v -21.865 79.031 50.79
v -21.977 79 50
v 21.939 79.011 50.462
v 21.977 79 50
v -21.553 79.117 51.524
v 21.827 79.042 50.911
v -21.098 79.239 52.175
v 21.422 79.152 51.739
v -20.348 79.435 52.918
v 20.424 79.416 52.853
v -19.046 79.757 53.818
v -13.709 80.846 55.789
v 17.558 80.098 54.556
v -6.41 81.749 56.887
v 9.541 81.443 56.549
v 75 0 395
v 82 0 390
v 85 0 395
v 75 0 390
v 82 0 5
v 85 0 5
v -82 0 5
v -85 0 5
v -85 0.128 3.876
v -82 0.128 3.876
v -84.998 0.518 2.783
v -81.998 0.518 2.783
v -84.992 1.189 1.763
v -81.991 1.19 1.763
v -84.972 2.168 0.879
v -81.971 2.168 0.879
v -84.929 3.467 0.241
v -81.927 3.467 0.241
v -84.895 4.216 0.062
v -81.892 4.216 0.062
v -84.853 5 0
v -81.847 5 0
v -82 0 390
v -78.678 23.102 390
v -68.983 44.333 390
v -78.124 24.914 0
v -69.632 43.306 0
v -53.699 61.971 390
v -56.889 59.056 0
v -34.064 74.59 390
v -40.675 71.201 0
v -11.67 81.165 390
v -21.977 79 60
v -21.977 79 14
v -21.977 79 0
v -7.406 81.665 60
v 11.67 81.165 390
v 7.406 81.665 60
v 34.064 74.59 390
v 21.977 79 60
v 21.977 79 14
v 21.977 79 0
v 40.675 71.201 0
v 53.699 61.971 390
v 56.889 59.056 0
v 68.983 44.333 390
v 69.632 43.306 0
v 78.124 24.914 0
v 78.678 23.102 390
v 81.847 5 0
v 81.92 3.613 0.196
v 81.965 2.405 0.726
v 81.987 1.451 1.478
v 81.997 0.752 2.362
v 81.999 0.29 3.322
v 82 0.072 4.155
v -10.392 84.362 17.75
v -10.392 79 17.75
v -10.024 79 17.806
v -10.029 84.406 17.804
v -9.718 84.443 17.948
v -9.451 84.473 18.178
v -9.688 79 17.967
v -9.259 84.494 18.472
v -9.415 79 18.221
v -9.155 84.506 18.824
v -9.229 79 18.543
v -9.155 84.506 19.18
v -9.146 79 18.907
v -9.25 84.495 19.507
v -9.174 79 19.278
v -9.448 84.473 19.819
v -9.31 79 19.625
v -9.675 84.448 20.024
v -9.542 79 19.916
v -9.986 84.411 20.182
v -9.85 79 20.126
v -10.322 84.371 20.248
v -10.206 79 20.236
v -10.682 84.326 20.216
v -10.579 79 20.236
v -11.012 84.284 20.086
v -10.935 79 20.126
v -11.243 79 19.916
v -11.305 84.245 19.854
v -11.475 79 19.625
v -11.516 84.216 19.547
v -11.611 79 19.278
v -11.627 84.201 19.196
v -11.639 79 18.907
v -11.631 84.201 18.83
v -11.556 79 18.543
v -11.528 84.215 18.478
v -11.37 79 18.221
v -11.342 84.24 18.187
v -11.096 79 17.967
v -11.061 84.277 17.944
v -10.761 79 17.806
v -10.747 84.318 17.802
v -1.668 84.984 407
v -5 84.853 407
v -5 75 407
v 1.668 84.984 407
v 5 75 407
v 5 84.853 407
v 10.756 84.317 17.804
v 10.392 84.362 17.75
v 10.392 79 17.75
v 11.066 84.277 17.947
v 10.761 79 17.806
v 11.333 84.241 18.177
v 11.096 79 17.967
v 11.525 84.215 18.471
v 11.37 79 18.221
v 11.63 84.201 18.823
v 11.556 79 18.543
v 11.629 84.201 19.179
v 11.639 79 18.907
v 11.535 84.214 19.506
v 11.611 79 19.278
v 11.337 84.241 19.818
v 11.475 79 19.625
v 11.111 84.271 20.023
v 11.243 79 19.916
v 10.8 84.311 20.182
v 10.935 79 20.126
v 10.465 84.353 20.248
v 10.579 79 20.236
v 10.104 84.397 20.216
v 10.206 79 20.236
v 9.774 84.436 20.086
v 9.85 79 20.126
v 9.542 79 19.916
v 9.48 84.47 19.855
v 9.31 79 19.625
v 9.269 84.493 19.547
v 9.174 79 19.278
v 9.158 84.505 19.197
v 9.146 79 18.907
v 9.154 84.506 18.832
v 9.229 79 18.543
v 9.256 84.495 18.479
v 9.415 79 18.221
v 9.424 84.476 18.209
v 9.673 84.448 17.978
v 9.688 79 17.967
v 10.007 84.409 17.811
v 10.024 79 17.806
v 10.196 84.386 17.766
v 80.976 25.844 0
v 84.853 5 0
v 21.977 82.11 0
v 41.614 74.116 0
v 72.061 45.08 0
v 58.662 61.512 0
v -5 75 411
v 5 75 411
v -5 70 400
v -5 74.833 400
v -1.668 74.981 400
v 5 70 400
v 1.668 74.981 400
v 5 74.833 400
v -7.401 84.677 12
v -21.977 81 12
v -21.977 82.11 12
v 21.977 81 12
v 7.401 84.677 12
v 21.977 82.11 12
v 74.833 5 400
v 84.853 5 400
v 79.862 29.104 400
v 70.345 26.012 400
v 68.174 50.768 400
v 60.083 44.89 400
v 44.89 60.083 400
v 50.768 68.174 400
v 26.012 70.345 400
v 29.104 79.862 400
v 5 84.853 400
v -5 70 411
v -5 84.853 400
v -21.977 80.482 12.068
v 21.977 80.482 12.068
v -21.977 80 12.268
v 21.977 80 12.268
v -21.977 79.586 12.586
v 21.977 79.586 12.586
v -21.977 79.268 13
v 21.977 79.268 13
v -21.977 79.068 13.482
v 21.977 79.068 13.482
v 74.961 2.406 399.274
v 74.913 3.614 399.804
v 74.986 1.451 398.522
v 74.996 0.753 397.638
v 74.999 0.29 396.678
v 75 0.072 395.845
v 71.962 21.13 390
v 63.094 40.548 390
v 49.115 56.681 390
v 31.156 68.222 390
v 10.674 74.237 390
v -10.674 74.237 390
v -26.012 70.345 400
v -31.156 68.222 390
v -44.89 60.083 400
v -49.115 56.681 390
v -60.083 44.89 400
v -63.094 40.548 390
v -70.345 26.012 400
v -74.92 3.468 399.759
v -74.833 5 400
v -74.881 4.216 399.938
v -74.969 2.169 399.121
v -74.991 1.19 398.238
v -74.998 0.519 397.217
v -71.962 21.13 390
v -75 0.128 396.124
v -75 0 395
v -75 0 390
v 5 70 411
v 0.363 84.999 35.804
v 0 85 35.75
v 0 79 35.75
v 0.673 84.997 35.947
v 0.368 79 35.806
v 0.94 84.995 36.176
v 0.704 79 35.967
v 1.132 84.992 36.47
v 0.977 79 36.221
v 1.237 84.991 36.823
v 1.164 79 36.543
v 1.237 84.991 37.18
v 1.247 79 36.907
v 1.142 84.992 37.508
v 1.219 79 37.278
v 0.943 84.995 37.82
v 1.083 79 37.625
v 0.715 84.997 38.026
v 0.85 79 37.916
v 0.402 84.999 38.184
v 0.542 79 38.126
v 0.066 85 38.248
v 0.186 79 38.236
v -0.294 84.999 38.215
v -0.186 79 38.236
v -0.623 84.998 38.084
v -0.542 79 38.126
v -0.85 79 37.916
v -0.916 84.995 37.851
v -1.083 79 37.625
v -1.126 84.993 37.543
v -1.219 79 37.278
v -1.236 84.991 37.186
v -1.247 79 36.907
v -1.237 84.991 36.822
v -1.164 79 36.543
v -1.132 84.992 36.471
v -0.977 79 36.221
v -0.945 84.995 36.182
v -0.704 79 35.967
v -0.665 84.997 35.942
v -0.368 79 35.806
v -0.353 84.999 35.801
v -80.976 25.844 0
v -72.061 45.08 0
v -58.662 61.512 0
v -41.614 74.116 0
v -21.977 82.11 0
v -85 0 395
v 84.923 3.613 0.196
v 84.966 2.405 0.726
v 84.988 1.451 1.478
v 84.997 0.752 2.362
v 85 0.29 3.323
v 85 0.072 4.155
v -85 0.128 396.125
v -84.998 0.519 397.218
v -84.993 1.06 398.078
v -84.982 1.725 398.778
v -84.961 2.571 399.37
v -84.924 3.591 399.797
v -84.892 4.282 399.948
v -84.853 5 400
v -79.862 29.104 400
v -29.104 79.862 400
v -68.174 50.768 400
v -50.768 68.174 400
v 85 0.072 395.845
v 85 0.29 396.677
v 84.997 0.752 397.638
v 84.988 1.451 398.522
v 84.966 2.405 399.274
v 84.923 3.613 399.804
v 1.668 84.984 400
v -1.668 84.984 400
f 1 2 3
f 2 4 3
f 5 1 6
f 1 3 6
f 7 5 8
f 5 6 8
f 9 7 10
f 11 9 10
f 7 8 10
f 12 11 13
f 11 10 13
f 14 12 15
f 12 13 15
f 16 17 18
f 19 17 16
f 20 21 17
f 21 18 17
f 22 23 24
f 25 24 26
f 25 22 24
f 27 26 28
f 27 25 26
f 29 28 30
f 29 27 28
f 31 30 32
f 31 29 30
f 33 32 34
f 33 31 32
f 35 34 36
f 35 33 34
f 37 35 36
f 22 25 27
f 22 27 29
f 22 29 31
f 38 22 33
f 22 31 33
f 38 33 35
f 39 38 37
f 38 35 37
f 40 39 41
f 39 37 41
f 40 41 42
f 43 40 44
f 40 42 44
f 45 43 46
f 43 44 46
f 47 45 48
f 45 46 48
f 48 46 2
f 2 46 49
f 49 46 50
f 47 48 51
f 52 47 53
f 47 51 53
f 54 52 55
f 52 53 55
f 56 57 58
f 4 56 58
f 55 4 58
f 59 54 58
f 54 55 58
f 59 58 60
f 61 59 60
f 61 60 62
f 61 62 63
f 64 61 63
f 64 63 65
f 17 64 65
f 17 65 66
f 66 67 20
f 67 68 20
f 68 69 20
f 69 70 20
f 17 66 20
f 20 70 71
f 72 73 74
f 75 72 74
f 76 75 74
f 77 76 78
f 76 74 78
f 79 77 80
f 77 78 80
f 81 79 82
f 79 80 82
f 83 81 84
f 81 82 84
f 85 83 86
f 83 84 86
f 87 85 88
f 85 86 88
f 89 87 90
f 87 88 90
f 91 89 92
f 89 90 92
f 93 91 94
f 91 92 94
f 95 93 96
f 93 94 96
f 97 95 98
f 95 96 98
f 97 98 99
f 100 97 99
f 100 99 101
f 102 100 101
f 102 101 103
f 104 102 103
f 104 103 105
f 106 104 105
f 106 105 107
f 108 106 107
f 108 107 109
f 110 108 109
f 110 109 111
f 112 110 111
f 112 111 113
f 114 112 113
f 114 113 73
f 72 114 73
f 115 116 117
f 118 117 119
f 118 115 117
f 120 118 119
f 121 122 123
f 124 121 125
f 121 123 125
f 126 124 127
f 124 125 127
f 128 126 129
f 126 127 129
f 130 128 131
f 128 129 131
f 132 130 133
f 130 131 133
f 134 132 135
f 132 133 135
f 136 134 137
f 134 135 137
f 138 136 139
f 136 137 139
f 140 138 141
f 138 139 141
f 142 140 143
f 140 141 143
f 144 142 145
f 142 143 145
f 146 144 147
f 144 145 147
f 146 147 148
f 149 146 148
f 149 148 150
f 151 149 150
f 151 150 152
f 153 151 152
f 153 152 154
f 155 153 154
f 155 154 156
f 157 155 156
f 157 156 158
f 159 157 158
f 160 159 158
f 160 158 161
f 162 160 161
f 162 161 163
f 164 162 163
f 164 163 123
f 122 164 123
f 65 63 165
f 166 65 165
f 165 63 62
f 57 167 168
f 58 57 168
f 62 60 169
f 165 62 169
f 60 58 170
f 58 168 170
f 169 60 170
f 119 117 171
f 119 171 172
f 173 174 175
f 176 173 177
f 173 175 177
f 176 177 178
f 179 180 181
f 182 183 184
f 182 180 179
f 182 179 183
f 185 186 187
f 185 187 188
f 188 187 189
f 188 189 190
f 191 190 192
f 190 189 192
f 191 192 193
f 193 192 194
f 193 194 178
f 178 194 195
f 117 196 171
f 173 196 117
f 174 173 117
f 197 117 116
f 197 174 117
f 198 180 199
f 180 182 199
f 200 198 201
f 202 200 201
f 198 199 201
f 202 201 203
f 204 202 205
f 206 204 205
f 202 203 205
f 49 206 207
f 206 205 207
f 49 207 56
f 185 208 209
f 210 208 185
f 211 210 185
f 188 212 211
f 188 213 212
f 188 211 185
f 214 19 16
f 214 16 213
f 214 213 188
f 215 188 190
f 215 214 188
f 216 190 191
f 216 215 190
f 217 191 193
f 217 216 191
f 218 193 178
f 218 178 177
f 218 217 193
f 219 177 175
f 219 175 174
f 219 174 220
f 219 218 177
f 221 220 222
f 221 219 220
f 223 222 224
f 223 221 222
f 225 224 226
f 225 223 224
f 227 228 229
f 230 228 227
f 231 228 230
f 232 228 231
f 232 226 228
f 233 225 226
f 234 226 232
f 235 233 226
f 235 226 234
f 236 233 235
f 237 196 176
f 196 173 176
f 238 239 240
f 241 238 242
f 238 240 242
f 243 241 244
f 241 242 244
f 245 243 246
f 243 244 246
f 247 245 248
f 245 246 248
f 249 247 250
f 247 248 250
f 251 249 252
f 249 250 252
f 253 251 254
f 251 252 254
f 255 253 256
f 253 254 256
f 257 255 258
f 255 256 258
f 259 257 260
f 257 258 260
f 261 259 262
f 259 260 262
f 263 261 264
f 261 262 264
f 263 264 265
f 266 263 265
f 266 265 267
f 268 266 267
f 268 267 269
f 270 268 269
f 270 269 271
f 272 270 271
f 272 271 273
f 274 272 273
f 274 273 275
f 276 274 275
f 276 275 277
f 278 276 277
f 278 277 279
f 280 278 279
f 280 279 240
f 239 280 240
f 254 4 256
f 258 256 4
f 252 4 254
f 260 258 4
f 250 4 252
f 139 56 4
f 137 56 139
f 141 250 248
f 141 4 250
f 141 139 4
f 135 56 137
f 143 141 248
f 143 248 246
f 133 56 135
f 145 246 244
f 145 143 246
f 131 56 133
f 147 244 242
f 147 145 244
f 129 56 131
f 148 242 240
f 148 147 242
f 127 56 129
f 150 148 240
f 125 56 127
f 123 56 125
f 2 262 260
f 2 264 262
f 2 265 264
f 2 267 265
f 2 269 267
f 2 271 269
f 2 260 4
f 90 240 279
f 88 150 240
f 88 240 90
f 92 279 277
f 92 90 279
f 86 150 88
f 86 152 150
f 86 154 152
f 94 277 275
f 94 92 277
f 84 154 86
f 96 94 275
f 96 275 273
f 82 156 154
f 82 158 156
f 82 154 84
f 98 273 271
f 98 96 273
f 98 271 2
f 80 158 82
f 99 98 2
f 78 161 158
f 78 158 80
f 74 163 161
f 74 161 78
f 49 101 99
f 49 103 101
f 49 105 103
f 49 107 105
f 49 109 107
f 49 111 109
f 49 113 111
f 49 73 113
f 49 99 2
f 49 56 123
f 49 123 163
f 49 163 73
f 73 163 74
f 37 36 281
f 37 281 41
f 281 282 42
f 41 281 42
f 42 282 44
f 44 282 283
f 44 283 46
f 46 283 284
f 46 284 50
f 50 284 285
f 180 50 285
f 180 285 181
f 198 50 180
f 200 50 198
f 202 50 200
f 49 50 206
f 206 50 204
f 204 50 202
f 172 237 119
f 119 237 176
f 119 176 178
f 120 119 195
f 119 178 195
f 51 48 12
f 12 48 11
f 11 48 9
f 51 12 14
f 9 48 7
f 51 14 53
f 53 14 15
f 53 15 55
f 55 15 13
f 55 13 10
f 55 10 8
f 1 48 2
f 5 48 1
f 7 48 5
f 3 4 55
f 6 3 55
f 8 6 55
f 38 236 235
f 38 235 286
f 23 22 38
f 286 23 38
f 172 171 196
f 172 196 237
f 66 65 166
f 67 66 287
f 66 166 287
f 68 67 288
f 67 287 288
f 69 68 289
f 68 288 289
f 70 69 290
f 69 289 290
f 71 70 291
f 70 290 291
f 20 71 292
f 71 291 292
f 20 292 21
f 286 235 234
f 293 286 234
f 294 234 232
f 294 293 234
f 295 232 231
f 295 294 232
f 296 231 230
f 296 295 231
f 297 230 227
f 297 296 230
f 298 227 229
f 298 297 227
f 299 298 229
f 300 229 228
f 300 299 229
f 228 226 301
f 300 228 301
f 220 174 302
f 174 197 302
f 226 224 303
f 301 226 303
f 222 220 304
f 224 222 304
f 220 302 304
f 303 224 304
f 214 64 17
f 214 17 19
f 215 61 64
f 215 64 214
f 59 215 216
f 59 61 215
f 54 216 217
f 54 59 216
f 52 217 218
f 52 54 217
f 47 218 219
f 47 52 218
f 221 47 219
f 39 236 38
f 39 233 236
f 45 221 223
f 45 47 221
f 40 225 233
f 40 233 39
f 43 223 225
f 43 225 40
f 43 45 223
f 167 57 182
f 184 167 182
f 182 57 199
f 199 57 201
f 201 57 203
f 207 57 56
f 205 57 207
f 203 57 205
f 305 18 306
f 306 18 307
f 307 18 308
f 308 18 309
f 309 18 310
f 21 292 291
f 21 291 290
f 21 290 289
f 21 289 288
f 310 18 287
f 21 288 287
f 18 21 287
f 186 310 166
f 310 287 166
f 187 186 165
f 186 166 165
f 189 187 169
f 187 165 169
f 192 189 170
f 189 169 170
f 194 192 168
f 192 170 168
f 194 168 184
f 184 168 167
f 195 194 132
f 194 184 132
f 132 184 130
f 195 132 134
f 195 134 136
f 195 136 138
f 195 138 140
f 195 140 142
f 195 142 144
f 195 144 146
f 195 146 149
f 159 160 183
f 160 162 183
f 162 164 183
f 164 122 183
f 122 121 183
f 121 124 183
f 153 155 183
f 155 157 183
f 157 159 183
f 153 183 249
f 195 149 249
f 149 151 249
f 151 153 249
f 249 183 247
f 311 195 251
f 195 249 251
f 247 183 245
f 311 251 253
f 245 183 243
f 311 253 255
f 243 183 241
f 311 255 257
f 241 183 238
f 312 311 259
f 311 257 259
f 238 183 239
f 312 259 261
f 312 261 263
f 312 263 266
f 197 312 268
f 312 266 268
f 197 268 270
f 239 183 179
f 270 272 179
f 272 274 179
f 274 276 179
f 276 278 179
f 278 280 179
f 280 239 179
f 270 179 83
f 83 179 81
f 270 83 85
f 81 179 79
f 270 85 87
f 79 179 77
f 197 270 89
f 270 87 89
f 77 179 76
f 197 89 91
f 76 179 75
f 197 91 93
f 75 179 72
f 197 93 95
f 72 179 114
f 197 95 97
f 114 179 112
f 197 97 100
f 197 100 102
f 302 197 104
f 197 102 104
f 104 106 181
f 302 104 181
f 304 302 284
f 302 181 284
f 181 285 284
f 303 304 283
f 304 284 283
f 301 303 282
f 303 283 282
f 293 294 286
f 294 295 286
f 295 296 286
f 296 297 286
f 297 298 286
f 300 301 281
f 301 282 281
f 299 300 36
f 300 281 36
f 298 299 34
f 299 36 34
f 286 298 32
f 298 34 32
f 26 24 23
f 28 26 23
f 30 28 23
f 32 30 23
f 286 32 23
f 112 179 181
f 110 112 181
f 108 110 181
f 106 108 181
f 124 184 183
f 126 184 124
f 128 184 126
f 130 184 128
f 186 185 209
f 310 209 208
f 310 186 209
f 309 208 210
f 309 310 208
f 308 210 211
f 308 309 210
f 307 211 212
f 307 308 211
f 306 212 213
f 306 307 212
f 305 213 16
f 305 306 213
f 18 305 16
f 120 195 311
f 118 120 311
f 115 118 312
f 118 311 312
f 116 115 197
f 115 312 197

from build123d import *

# Parameters (mm, degrees)
BOSS_EXTRUDE1_DEPTH = 400
BOSS_EXTRUDE3_DEPTH = 60
FILLET4_R           = 10
SKETCH6_R           = 1.25
SKETCH6_W           = 43.954521952
SKETCH6_H           = 12
CUT_EXTRUDE5_DEPTH  = 50
BOSS_EXTRUDE4_START = -10
BOSS_EXTRUDE4_DEPTH = 10
BOSS_EXTRUDE5_DEPTH = 7
SKETCH10_W          = 10
SKETCH10_H          = 5
BOSS_EXTRUDE6_DEPTH = 4
FILLET6_R           = 5
FILLET7_R           = 2


with BuildPart() as part:
    # Sketch1 → Boss-Extrude1 (new body)
    with BuildSketch(Plane.XY):
        with BuildLine():
            Line((-85, 0), (-82, 0))
            ThreePointArc((-82, 0), (0, 82), (82, 0))
            Line((82, 0), (85, 0))
            ThreePointArc((85, 0), (0, 85), (-85, 0))
        make_face()
    extrude(amount=BOSS_EXTRUDE1_DEPTH)

    # Sketch5 → Boss-Extrude3 (add)
    with BuildSketch(Plane(origin=(0, 0, 0), x_dir=(-1, 0, 0), z_dir=(0, 0, -1))):
        with BuildLine():
            Line((-21.977260976, 79), (21.977260976, 79))
            ThreePointArc((21.977260976, 79), (0, 82), (-21.977260976, 79))
        make_face()
    extrude(amount=-BOSS_EXTRUDE3_DEPTH)

    # Fillet4
    # the kernel refuses this fillet: 10 mm, written as the material it takes off along each edge
    with BuildSketch(Plane(origin=(46.977260976, 79, 60), x_dir=(0, 0, -1), z_dir=(-1, 0, 0))) as fillet4_piece_1_section:
        with BuildLine():
            CenterArc((FILLET4_R, -FILLET4_R), FILLET4_R, 90, 90)
            Line((0, -FILLET4_R), (0, 0))
            Line((0, 0), (FILLET4_R, 0))
        make_face()
    fillet4_piece_1 = extrude(amount=93.954521952, mode=Mode.PRIVATE)
    fillet4_piece_1 = fillet4_piece_1 & Plane(origin=(0, 0, 56.767461198), x_dir=(-1, 0, 0), z_dir=(0, 0, -1)) * Cylinder(82, 228, mode=Mode.PRIVATE)
    add(fillet4_piece_1, mode=Mode.SUBTRACT)

    # Sketch6 → Cut-Extrude5 (cut)
    with BuildSketch(Plane.XZ.offset(-79)):
        with Locations(Location((0, 37, 0), (0, 0, 270))):
            Circle(SKETCH6_R)
        with Locations(Location((10.392304845, 19, 0), (0, 0, 270))):
            Circle(SKETCH6_R)
        with Locations(Location((-10.392304845, 19, 0), (0, 0, 270))):
            Circle(SKETCH6_R)
        with Locations((0, 6)):
            Rectangle(SKETCH6_W, SKETCH6_H)
    extrude(amount=-CUT_EXTRUDE5_DEPTH, mode=Mode.SUBTRACT)

    # Sketch7 → Boss-Extrude4 (add)
    with BuildSketch(Plane.XY.offset(400).offset(BOSS_EXTRUDE4_START)):
        with BuildLine():
            Line((-75, 0), (-82, 0))
            ThreePointArc((-82, 0), (0, 82), (82, 0))
            Line((82, 0), (75, 0))
            ThreePointArc((75, 0), (0, 75), (-75, 0))
        make_face()
    extrude(amount=BOSS_EXTRUDE4_DEPTH)

    # Sketch9 → Boss-Extrude5 (add)
    with BuildSketch(Plane.XY.offset(400)):
        with BuildLine():
            Line((-5, 84.852813742), (-5, 80))
            Line((-5, 80), (-5, 74.833147735))
            Line((-5, 74.833147735), (-5, 70))
            Line((-5, 70), (5, 70))
            Line((5, 70), (5, 74.833147735))
            Line((5, 74.833147735), (5, 80))
            Line((5, 80), (5, 84.852813742))
            ThreePointArc((5, 84.852813742), (0, 85), (-5, 84.852813742))
        make_face()
    extrude(amount=BOSS_EXTRUDE5_DEPTH)

    # Sketch10 → Boss-Extrude6 (add)
    with BuildSketch(Plane.XY.offset(407)):
        with Locations((0, 72.5)):
            Rectangle(SKETCH10_W, SKETCH10_H)
    extrude(amount=BOSS_EXTRUDE6_DEPTH)

    # Fillet6
    fillet6_edges = [part.edges().sort_by_distance(p)[0] for p in [
        (80, 0, 400),
        (83.5, 0, 0),
        (-83.5, 0, 0),
        (-80, 0, 400),
    ]]
    fillet(fillet6_edges, radius=FILLET6_R)

    # Fillet7
    fillet7_edges = [part.edges().sort_by_distance(p)[0] for p in [
        (0, 79, 12),
    ]]
    fillet(fillet7_edges, radius=FILLET7_R)


solid = part.part
